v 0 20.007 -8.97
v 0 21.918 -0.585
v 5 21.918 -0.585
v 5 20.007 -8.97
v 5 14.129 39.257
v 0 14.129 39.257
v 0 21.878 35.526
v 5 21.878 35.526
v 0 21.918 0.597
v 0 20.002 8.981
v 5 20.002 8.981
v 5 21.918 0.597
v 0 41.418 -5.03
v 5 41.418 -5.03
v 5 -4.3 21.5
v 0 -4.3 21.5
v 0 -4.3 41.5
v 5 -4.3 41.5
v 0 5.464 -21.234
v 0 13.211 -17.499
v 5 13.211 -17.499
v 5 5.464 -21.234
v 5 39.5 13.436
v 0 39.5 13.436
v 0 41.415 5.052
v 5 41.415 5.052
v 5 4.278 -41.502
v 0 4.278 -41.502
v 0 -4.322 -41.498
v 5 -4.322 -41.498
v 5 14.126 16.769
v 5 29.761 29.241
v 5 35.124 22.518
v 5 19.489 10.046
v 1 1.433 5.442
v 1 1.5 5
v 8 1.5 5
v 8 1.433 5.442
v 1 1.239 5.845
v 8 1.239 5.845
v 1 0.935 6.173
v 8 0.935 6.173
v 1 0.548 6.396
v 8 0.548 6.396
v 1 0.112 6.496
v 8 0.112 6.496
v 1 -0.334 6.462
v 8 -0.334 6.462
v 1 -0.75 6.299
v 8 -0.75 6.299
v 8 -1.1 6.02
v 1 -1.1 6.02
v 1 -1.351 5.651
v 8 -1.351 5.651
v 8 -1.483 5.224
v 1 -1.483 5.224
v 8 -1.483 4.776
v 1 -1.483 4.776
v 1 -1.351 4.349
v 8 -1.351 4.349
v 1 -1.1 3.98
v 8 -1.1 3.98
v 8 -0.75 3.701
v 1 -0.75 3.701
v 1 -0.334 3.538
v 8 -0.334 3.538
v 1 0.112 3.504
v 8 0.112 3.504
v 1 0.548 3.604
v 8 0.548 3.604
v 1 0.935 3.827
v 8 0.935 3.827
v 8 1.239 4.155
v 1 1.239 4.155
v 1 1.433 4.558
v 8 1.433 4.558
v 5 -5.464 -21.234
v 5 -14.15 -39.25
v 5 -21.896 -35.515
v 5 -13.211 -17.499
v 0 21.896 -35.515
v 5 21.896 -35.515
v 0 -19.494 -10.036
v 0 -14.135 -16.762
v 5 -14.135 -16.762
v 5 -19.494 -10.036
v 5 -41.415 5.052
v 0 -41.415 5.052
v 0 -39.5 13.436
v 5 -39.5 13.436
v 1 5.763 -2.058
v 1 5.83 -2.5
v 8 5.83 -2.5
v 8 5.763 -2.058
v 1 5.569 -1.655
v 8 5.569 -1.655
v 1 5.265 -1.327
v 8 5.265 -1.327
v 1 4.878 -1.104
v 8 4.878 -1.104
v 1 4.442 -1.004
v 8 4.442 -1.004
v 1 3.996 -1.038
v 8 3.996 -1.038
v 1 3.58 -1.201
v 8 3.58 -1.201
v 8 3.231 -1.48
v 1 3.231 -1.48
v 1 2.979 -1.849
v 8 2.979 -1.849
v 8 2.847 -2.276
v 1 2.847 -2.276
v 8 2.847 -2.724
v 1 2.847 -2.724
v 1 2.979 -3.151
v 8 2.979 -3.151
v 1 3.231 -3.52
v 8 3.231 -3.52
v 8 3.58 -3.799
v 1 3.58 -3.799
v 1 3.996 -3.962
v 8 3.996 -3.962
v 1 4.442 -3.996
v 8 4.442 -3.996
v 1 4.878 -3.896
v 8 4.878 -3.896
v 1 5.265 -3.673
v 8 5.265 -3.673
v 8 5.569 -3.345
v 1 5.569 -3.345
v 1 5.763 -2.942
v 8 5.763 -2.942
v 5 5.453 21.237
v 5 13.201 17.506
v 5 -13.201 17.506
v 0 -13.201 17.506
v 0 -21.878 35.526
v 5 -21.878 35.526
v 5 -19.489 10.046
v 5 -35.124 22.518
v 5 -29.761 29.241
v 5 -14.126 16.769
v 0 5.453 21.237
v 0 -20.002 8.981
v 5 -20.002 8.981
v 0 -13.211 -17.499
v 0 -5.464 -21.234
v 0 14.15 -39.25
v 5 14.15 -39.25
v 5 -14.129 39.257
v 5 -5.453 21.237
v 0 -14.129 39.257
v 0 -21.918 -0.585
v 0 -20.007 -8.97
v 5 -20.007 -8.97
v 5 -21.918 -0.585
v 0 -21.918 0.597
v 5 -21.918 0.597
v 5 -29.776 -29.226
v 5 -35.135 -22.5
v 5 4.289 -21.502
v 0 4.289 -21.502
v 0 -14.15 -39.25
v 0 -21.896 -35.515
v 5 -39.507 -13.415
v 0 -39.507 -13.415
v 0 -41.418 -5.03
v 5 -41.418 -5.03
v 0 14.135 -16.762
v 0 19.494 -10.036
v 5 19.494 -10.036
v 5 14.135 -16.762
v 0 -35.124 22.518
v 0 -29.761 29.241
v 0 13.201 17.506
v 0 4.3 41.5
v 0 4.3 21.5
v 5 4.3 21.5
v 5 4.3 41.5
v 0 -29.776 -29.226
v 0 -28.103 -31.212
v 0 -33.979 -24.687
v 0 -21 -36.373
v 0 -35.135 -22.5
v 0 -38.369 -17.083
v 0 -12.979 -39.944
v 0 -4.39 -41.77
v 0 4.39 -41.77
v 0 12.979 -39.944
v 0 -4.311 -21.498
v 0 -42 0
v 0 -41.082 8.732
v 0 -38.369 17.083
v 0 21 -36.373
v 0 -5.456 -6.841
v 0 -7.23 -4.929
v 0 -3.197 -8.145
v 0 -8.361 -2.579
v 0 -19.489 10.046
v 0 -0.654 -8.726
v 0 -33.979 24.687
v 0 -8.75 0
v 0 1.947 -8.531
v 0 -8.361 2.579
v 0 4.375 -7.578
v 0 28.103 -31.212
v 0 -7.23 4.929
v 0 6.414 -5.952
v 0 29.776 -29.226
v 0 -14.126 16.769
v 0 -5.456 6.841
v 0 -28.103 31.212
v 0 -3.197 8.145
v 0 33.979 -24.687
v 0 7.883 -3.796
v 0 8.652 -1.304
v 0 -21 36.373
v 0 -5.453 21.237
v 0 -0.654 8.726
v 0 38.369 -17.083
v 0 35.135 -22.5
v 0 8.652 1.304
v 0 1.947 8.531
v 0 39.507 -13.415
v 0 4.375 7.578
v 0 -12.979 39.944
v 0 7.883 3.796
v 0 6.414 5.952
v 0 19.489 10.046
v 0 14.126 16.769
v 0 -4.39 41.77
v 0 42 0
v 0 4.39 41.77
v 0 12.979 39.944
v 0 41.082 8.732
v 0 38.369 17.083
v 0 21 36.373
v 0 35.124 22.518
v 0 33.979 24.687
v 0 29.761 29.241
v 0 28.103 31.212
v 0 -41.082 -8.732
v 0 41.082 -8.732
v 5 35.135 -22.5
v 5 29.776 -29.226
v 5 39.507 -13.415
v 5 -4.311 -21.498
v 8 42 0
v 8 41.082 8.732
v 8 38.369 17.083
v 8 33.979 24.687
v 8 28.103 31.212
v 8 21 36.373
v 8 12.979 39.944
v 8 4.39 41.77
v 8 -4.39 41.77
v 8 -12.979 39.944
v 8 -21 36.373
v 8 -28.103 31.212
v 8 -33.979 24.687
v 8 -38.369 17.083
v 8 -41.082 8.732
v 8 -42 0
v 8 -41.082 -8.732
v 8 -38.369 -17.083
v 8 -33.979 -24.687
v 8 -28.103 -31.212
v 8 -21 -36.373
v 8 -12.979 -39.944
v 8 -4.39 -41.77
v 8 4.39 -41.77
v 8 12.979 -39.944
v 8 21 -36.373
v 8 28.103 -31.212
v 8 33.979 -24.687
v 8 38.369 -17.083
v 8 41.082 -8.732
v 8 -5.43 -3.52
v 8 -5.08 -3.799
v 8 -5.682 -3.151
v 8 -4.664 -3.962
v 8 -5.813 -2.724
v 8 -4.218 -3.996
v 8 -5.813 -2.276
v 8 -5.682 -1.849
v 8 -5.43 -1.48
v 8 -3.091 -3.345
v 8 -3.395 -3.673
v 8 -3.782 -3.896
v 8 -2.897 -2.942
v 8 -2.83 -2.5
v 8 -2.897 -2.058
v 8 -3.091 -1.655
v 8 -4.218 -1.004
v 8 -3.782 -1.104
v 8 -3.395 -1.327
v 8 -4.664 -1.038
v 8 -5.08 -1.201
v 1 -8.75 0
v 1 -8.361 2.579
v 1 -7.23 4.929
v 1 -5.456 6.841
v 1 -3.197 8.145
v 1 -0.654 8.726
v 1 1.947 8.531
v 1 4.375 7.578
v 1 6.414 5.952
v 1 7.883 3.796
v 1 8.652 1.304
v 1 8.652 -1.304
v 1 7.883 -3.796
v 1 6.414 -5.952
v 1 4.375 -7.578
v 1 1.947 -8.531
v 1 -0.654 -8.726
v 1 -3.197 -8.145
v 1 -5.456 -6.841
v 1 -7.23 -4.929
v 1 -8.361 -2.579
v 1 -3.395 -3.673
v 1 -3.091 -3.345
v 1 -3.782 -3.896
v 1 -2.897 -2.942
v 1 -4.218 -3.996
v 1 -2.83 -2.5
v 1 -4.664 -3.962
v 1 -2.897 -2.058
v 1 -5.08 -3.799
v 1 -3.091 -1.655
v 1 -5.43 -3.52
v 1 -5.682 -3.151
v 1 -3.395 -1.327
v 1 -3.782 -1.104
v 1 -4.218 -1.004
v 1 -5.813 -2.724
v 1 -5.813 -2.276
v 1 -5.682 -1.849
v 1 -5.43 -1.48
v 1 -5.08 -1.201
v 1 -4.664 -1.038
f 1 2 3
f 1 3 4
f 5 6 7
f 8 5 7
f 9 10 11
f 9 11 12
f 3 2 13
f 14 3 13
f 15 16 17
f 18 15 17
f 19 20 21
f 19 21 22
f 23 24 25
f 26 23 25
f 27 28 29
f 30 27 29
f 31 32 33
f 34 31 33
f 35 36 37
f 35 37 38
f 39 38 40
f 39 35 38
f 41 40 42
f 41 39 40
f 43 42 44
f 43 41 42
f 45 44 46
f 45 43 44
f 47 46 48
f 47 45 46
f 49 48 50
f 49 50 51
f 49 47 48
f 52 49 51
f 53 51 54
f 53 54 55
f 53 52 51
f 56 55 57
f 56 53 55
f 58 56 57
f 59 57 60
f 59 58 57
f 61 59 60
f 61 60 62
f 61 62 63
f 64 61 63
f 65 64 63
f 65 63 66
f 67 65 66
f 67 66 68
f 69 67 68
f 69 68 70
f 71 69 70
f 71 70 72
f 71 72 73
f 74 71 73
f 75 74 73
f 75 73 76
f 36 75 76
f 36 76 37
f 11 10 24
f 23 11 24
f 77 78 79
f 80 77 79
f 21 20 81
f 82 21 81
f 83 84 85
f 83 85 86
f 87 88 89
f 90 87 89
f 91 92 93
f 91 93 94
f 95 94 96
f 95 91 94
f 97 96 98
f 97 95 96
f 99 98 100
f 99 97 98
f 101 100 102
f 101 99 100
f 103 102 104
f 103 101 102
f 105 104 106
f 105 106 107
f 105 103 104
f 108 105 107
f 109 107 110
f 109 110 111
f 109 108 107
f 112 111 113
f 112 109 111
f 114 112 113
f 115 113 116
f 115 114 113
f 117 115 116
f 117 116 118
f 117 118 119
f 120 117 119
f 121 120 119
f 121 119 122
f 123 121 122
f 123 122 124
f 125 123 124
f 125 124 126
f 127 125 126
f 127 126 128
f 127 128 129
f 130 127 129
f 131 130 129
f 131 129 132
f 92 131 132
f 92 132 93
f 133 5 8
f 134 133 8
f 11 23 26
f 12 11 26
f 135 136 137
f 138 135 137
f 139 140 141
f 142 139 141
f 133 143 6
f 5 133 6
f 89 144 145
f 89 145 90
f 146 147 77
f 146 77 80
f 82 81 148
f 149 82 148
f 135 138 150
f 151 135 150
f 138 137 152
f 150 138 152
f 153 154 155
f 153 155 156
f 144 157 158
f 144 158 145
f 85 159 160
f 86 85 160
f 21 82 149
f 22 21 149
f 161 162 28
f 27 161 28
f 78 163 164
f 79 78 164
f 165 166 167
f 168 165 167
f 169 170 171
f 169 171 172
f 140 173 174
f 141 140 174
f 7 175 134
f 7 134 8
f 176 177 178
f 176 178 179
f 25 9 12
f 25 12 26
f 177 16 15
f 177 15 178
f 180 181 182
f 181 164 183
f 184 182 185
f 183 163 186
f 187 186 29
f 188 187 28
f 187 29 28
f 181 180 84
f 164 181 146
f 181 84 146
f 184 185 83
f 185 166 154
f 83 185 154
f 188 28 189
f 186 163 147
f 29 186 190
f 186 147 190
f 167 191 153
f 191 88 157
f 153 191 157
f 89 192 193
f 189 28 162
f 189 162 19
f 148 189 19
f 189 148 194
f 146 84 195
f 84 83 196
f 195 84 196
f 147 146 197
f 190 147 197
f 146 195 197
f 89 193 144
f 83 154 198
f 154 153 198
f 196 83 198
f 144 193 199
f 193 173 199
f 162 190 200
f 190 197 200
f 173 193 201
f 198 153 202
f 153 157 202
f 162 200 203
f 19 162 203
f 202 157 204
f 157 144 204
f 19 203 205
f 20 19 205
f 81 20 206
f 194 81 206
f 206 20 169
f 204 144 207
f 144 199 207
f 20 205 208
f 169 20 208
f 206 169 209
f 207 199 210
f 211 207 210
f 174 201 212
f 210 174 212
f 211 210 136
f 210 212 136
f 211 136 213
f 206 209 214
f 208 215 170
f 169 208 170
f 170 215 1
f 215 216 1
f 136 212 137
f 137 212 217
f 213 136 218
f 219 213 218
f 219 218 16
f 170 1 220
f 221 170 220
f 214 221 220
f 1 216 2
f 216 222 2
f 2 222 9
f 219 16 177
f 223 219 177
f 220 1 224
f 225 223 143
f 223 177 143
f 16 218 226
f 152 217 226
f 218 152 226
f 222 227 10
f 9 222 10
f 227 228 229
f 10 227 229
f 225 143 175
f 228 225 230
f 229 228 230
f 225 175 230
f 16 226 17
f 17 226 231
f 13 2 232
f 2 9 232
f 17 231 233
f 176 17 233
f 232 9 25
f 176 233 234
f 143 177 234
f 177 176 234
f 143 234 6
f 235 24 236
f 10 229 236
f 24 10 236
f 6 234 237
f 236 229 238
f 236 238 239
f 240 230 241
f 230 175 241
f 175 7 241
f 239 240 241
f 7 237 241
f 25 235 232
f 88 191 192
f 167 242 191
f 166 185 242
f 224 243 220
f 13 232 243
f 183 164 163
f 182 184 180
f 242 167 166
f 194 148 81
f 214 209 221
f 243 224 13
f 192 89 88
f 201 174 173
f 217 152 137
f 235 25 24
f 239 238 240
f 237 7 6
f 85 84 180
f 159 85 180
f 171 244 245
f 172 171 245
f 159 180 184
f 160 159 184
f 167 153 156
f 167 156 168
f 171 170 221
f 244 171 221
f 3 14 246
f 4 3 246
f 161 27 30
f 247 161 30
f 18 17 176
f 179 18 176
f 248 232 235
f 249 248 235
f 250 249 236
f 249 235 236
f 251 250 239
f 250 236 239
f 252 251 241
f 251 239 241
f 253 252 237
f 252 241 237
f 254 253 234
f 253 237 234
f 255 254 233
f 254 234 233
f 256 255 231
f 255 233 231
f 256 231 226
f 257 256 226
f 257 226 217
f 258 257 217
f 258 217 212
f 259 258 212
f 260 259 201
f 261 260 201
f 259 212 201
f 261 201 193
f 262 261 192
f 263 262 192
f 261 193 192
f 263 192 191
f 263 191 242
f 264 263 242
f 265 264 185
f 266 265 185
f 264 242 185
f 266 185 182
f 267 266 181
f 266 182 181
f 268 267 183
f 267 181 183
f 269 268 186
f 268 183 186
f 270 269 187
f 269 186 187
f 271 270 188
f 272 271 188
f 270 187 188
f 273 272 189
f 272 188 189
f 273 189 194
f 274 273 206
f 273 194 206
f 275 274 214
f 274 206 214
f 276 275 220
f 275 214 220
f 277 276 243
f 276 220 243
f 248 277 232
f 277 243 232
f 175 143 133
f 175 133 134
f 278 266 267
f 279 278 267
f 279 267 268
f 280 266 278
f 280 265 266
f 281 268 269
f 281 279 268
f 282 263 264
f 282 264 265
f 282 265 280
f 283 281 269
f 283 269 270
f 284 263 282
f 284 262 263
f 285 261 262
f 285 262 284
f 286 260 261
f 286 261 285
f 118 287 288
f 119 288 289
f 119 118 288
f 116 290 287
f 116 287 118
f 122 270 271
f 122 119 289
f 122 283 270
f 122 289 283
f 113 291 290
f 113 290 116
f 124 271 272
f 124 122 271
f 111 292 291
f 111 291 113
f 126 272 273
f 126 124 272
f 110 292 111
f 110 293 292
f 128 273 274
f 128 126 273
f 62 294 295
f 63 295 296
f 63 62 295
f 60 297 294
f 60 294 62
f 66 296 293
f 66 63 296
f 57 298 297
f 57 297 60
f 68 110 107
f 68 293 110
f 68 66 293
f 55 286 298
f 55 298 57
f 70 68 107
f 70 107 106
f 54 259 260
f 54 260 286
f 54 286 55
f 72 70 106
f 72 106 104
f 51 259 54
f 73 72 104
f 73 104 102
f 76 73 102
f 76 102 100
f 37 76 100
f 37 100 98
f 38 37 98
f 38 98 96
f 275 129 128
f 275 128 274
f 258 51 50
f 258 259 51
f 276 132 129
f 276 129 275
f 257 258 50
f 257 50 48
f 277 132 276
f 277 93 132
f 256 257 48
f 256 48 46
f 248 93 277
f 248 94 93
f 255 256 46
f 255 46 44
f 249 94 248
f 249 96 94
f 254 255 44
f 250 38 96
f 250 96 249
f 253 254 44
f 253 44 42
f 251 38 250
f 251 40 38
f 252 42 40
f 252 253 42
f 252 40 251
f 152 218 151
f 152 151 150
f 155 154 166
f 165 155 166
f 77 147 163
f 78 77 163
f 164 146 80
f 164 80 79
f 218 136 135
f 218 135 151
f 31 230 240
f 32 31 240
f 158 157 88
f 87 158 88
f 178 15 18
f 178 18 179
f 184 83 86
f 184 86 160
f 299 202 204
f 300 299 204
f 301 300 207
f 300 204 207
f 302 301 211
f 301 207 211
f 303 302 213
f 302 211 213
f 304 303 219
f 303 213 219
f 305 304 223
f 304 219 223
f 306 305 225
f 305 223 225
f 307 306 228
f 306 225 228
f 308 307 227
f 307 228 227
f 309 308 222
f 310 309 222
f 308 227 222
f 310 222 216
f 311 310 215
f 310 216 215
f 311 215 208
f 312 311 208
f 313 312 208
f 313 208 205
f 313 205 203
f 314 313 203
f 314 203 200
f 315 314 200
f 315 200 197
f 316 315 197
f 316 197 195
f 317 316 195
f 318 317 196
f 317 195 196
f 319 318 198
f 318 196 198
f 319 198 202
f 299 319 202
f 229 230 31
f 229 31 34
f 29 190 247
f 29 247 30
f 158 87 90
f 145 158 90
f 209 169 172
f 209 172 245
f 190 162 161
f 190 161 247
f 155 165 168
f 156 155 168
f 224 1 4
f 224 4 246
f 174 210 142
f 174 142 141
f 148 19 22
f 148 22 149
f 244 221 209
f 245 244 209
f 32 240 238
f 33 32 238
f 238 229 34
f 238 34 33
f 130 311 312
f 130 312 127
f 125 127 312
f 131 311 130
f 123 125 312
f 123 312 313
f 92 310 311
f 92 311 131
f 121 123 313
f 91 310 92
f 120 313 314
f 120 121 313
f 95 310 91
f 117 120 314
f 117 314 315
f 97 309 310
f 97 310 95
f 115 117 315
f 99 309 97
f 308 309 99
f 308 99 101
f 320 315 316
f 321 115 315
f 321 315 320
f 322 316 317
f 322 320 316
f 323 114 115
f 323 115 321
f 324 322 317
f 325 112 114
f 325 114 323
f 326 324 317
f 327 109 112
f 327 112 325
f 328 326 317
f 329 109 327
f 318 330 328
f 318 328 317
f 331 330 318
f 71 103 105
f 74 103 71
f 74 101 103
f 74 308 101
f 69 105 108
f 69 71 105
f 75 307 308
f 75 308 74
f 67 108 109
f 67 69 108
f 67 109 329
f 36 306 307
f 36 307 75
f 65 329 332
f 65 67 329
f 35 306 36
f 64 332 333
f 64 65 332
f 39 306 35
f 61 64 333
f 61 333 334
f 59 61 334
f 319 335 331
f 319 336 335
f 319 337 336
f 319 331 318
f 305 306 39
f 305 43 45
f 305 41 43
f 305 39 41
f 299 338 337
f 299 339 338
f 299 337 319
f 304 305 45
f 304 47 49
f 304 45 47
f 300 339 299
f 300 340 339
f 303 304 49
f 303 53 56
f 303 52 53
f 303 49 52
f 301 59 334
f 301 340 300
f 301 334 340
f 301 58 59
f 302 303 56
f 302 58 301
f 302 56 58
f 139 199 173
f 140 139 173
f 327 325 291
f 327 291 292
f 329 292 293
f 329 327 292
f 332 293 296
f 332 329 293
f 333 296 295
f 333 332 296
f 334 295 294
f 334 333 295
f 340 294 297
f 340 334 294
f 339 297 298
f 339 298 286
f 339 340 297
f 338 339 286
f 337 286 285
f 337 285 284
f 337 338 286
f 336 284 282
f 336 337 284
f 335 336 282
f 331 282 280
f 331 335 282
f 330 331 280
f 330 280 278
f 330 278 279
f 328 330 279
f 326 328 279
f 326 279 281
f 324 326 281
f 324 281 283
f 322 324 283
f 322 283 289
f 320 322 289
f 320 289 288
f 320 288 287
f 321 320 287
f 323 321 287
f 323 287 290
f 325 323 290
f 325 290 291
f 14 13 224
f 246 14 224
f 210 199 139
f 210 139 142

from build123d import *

# Parameters (mm, degrees)
SKETCH086_W             = 8.6
SKETCH086_H             = 20
PAD067_DEPTH            = 5
SKETCH087_W             = 8.6
SKETCH087_H             = 20
PAD068_DEPTH            = 5
BODY068_PLACEMENT_ANGLE = 334.29
SKETCH088_W             = 8.6
SKETCH088_H             = 20
PAD069_DEPTH            = 5
BODY069_PLACEMENT_ANGLE = 308.58
SKETCH089_W             = 8.6
SKETCH089_H             = 20
PAD070_DEPTH            = 5
BODY070_PLACEMENT_ANGLE = 282.87
SKETCH090_W             = 8.6
SKETCH090_H             = 20
PAD071_DEPTH            = 5
BODY071_PLACEMENT_ANGLE = 257.16
SKETCH091_W             = 8.6
SKETCH091_H             = 20
PAD072_DEPTH            = 5
BODY072_PLACEMENT_ANGLE = 231.45
SKETCH092_W             = 8.6
SKETCH092_H             = 20
PAD073_DEPTH            = 5
BODY073_PLACEMENT_ANGLE = 205.74
SKETCH093_W             = 8.6
SKETCH093_H             = 20
PAD074_DEPTH            = 5
BODY074_PLACEMENT_ANGLE = 179.97
SKETCH094_W             = 8.6
SKETCH094_H             = 20
PAD075_DEPTH            = 5
BODY075_PLACEMENT_ANGLE = 154.26
SKETCH095_W             = 8.6
SKETCH095_H             = 20
PAD076_DEPTH            = 5
BODY076_PLACEMENT_ANGLE = 128.55
SKETCH096_W             = 8.6
SKETCH096_H             = 20
PAD077_DEPTH            = 5
BODY077_PLACEMENT_ANGLE = 102.84
SKETCH097_W             = 8.6
SKETCH097_H             = 20
PAD078_DEPTH            = 5
BODY078_PLACEMENT_ANGLE = 77.13
SKETCH098_W             = 8.6
SKETCH098_H             = 20
PAD079_DEPTH            = 5
BODY079_PLACEMENT_ANGLE = 51.42
SKETCH099_W             = 8.6
SKETCH099_H             = 20
PAD080_DEPTH            = 5
BODY080_PLACEMENT_ANGLE = 25.71
SKETCH019_R             = 42
SKETCH019_R_2           = 1.5
PAD016_DEPTH            = 8
SKETCH100_R             = 8.75
POCKET009_DEPTH         = 1


with BuildPart() as body067:
    # Sketch086 → Pad067 (new body)
    with BuildSketch(Plane.YZ):
        with Locations((0, 31.5)):
            Rectangle(SKETCH086_W, SKETCH086_H)
    extrude(amount=PAD067_DEPTH)


with BuildPart() as body068:
    # Sketch087 → Pad068 (new body)
    with BuildSketch(Plane.YZ):
        with Locations((0, 31.5)):
            Rectangle(SKETCH087_W, SKETCH087_H)
    extrude(amount=PAD068_DEPTH)


with BuildPart() as body068_1:
    # Body068 placement: moved
    add(body068.part.rotate(Axis((0, 0, 0), (1, 0, 0)), BODY068_PLACEMENT_ANGLE))


with BuildPart() as body069:
    # Sketch088 → Pad069 (new body)
    with BuildSketch(Plane.YZ):
        with Locations((0, 31.5)):
            Rectangle(SKETCH088_W, SKETCH088_H)
    extrude(amount=PAD069_DEPTH)


with BuildPart() as body069_1:
    # Body069 placement: moved
    add(body069.part.rotate(Axis((0, 0, 0), (1, 0, 0)), BODY069_PLACEMENT_ANGLE))


with BuildPart() as body070:
    # Sketch089 → Pad070 (new body)
    with BuildSketch(Plane.YZ):
        with Locations((0, 31.5)):
            Rectangle(SKETCH089_W, SKETCH089_H)
    extrude(amount=PAD070_DEPTH)


with BuildPart() as body070_1:
    # Body070 placement: moved
    add(body070.part.rotate(Axis((0, 0, 0), (1, 0, 0)), BODY070_PLACEMENT_ANGLE))


with BuildPart() as body071:
    # Sketch090 → Pad071 (new body)
    with BuildSketch(Plane.YZ):
        with Locations((0, 31.5)):
            Rectangle(SKETCH090_W, SKETCH090_H)
    extrude(amount=PAD071_DEPTH)


with BuildPart() as body071_1:
    # Body071 placement: moved
    add(body071.part.rotate(Axis((0, 0, 0), (1, 0, 0)), BODY071_PLACEMENT_ANGLE))


with BuildPart() as body072:
    # Sketch091 → Pad072 (new body)
    with BuildSketch(Plane.YZ):
        with Locations((0, 31.5)):
            Rectangle(SKETCH091_W, SKETCH091_H)
    extrude(amount=PAD072_DEPTH)


with BuildPart() as body072_1:
    # Body072 placement: moved
    add(body072.part.rotate(Axis((0, 0, 0), (1, 0, 0)), BODY072_PLACEMENT_ANGLE))


with BuildPart() as body073:
    # Sketch092 → Pad073 (new body)
    with BuildSketch(Plane.YZ):
        with Locations((0, 31.5)):
            Rectangle(SKETCH092_W, SKETCH092_H)
    extrude(amount=PAD073_DEPTH)


with BuildPart() as body073_1:
    # Body073 placement: moved
    add(body073.part.rotate(Axis((0, 0, 0), (1, 0, 0)), BODY073_PLACEMENT_ANGLE))


with BuildPart() as body074:
    # Sketch093 → Pad074 (new body)
    with BuildSketch(Plane.YZ):
        with Locations((0, 31.5)):
            Rectangle(SKETCH093_W, SKETCH093_H)
    extrude(amount=PAD074_DEPTH)


with BuildPart() as body074_1:
    # Body074 placement: moved
    add(body074.part.rotate(Axis((0, 0, 0), (1, 0, 0)), BODY074_PLACEMENT_ANGLE))


with BuildPart() as body075:
    # Sketch094 → Pad075 (new body)
    with BuildSketch(Plane.YZ):
        with Locations((0, 31.5)):
            Rectangle(SKETCH094_W, SKETCH094_H)
    extrude(amount=PAD075_DEPTH)


with BuildPart() as body075_1:
    # Body075 placement: moved
    add(body075.part.rotate(Axis((0, 0, 0), (1, 0, 0)), BODY075_PLACEMENT_ANGLE))


with BuildPart() as body076:
    # Sketch095 → Pad076 (new body)
    with BuildSketch(Plane.YZ):
        with Locations((0, 31.5)):
            Rectangle(SKETCH095_W, SKETCH095_H)
    extrude(amount=PAD076_DEPTH)


with BuildPart() as body076_1:
    # Body076 placement: moved
    add(body076.part.rotate(Axis((0, 0, 0), (1, 0, 0)), BODY076_PLACEMENT_ANGLE))


with BuildPart() as body077:
    # Sketch096 → Pad077 (new body)
    with BuildSketch(Plane.YZ):
        with Locations((0, 31.5)):
            Rectangle(SKETCH096_W, SKETCH096_H)
    extrude(amount=PAD077_DEPTH)


with BuildPart() as body077_1:
    # Body077 placement: moved
    add(body077.part.rotate(Axis((0, 0, 0), (1, 0, 0)), BODY077_PLACEMENT_ANGLE))


with BuildPart() as body078:
    # Sketch097 → Pad078 (new body)
    with BuildSketch(Plane.YZ):
        with Locations((0, 31.5)):
            Rectangle(SKETCH097_W, SKETCH097_H)
    extrude(amount=PAD078_DEPTH)


with BuildPart() as body078_1:
    # Body078 placement: moved
    add(body078.part.rotate(Axis((0, 0, 0), (1, 0, 0)), BODY078_PLACEMENT_ANGLE))


with BuildPart() as body079:
    # Sketch098 → Pad079 (new body)
    with BuildSketch(Plane.YZ):
        with Locations((0, 31.5)):
            Rectangle(SKETCH098_W, SKETCH098_H)
    extrude(amount=PAD079_DEPTH)


with BuildPart() as body079_1:
    # Body079 placement: moved
    add(body079.part.rotate(Axis((0, 0, 0), (1, 0, 0)), BODY079_PLACEMENT_ANGLE))


with BuildPart() as body080:
    # Sketch099 → Pad080 (new body)
    with BuildSketch(Plane.YZ):
        with Locations((0, 31.5)):
            Rectangle(SKETCH099_W, SKETCH099_H)
    extrude(amount=PAD080_DEPTH)


with BuildPart() as body080_1:
    # Body080 placement: moved
    add(body080.part.rotate(Axis((0, 0, 0), (1, 0, 0)), BODY080_PLACEMENT_ANGLE))


with BuildPart() as body016:
    # Sketch019 → Pad016 (new body)
    with BuildSketch(Plane.YZ):
        Circle(SKETCH019_R)
        with Locations((0, 5)):
            Circle(SKETCH019_R_2, mode=Mode.SUBTRACT)
        with Locations((4.330127, -2.5)):
            Circle(SKETCH019_R_2, mode=Mode.SUBTRACT)
        with Locations((-4.330127, -2.5)):
            Circle(SKETCH019_R_2, mode=Mode.SUBTRACT)
    extrude(amount=PAD016_DEPTH)

    # Boolean014: cut Body067, Body068, Body069, Body070, Body071, Body072, Body073, Body074, Body075, Body076, Body077, Body078, Body079, Body080
    add(body067.part, mode=Mode.SUBTRACT)
    add(body068_1.part, mode=Mode.SUBTRACT)
    add(body069_1.part, mode=Mode.SUBTRACT)
    add(body070_1.part, mode=Mode.SUBTRACT)
    add(body071_1.part, mode=Mode.SUBTRACT)
    add(body072_1.part, mode=Mode.SUBTRACT)
    add(body073_1.part, mode=Mode.SUBTRACT)
    add(body074_1.part, mode=Mode.SUBTRACT)
    add(body075_1.part, mode=Mode.SUBTRACT)
    add(body076_1.part, mode=Mode.SUBTRACT)
    add(body077_1.part, mode=Mode.SUBTRACT)
    add(body078_1.part, mode=Mode.SUBTRACT)
    add(body079_1.part, mode=Mode.SUBTRACT)
    add(body080_1.part, mode=Mode.SUBTRACT)

    # Sketch100 (on DatumPlane) → Pocket009 (cut)
    with BuildSketch(Plane(origin=(0, 0, 0), x_dir=(0, -1, 0), z_dir=(-1, 0, 0))):
        Circle(SKETCH100_R)
    extrude(amount=-POCKET009_DEPTH, mode=Mode.SUBTRACT)


solid = body016.part
